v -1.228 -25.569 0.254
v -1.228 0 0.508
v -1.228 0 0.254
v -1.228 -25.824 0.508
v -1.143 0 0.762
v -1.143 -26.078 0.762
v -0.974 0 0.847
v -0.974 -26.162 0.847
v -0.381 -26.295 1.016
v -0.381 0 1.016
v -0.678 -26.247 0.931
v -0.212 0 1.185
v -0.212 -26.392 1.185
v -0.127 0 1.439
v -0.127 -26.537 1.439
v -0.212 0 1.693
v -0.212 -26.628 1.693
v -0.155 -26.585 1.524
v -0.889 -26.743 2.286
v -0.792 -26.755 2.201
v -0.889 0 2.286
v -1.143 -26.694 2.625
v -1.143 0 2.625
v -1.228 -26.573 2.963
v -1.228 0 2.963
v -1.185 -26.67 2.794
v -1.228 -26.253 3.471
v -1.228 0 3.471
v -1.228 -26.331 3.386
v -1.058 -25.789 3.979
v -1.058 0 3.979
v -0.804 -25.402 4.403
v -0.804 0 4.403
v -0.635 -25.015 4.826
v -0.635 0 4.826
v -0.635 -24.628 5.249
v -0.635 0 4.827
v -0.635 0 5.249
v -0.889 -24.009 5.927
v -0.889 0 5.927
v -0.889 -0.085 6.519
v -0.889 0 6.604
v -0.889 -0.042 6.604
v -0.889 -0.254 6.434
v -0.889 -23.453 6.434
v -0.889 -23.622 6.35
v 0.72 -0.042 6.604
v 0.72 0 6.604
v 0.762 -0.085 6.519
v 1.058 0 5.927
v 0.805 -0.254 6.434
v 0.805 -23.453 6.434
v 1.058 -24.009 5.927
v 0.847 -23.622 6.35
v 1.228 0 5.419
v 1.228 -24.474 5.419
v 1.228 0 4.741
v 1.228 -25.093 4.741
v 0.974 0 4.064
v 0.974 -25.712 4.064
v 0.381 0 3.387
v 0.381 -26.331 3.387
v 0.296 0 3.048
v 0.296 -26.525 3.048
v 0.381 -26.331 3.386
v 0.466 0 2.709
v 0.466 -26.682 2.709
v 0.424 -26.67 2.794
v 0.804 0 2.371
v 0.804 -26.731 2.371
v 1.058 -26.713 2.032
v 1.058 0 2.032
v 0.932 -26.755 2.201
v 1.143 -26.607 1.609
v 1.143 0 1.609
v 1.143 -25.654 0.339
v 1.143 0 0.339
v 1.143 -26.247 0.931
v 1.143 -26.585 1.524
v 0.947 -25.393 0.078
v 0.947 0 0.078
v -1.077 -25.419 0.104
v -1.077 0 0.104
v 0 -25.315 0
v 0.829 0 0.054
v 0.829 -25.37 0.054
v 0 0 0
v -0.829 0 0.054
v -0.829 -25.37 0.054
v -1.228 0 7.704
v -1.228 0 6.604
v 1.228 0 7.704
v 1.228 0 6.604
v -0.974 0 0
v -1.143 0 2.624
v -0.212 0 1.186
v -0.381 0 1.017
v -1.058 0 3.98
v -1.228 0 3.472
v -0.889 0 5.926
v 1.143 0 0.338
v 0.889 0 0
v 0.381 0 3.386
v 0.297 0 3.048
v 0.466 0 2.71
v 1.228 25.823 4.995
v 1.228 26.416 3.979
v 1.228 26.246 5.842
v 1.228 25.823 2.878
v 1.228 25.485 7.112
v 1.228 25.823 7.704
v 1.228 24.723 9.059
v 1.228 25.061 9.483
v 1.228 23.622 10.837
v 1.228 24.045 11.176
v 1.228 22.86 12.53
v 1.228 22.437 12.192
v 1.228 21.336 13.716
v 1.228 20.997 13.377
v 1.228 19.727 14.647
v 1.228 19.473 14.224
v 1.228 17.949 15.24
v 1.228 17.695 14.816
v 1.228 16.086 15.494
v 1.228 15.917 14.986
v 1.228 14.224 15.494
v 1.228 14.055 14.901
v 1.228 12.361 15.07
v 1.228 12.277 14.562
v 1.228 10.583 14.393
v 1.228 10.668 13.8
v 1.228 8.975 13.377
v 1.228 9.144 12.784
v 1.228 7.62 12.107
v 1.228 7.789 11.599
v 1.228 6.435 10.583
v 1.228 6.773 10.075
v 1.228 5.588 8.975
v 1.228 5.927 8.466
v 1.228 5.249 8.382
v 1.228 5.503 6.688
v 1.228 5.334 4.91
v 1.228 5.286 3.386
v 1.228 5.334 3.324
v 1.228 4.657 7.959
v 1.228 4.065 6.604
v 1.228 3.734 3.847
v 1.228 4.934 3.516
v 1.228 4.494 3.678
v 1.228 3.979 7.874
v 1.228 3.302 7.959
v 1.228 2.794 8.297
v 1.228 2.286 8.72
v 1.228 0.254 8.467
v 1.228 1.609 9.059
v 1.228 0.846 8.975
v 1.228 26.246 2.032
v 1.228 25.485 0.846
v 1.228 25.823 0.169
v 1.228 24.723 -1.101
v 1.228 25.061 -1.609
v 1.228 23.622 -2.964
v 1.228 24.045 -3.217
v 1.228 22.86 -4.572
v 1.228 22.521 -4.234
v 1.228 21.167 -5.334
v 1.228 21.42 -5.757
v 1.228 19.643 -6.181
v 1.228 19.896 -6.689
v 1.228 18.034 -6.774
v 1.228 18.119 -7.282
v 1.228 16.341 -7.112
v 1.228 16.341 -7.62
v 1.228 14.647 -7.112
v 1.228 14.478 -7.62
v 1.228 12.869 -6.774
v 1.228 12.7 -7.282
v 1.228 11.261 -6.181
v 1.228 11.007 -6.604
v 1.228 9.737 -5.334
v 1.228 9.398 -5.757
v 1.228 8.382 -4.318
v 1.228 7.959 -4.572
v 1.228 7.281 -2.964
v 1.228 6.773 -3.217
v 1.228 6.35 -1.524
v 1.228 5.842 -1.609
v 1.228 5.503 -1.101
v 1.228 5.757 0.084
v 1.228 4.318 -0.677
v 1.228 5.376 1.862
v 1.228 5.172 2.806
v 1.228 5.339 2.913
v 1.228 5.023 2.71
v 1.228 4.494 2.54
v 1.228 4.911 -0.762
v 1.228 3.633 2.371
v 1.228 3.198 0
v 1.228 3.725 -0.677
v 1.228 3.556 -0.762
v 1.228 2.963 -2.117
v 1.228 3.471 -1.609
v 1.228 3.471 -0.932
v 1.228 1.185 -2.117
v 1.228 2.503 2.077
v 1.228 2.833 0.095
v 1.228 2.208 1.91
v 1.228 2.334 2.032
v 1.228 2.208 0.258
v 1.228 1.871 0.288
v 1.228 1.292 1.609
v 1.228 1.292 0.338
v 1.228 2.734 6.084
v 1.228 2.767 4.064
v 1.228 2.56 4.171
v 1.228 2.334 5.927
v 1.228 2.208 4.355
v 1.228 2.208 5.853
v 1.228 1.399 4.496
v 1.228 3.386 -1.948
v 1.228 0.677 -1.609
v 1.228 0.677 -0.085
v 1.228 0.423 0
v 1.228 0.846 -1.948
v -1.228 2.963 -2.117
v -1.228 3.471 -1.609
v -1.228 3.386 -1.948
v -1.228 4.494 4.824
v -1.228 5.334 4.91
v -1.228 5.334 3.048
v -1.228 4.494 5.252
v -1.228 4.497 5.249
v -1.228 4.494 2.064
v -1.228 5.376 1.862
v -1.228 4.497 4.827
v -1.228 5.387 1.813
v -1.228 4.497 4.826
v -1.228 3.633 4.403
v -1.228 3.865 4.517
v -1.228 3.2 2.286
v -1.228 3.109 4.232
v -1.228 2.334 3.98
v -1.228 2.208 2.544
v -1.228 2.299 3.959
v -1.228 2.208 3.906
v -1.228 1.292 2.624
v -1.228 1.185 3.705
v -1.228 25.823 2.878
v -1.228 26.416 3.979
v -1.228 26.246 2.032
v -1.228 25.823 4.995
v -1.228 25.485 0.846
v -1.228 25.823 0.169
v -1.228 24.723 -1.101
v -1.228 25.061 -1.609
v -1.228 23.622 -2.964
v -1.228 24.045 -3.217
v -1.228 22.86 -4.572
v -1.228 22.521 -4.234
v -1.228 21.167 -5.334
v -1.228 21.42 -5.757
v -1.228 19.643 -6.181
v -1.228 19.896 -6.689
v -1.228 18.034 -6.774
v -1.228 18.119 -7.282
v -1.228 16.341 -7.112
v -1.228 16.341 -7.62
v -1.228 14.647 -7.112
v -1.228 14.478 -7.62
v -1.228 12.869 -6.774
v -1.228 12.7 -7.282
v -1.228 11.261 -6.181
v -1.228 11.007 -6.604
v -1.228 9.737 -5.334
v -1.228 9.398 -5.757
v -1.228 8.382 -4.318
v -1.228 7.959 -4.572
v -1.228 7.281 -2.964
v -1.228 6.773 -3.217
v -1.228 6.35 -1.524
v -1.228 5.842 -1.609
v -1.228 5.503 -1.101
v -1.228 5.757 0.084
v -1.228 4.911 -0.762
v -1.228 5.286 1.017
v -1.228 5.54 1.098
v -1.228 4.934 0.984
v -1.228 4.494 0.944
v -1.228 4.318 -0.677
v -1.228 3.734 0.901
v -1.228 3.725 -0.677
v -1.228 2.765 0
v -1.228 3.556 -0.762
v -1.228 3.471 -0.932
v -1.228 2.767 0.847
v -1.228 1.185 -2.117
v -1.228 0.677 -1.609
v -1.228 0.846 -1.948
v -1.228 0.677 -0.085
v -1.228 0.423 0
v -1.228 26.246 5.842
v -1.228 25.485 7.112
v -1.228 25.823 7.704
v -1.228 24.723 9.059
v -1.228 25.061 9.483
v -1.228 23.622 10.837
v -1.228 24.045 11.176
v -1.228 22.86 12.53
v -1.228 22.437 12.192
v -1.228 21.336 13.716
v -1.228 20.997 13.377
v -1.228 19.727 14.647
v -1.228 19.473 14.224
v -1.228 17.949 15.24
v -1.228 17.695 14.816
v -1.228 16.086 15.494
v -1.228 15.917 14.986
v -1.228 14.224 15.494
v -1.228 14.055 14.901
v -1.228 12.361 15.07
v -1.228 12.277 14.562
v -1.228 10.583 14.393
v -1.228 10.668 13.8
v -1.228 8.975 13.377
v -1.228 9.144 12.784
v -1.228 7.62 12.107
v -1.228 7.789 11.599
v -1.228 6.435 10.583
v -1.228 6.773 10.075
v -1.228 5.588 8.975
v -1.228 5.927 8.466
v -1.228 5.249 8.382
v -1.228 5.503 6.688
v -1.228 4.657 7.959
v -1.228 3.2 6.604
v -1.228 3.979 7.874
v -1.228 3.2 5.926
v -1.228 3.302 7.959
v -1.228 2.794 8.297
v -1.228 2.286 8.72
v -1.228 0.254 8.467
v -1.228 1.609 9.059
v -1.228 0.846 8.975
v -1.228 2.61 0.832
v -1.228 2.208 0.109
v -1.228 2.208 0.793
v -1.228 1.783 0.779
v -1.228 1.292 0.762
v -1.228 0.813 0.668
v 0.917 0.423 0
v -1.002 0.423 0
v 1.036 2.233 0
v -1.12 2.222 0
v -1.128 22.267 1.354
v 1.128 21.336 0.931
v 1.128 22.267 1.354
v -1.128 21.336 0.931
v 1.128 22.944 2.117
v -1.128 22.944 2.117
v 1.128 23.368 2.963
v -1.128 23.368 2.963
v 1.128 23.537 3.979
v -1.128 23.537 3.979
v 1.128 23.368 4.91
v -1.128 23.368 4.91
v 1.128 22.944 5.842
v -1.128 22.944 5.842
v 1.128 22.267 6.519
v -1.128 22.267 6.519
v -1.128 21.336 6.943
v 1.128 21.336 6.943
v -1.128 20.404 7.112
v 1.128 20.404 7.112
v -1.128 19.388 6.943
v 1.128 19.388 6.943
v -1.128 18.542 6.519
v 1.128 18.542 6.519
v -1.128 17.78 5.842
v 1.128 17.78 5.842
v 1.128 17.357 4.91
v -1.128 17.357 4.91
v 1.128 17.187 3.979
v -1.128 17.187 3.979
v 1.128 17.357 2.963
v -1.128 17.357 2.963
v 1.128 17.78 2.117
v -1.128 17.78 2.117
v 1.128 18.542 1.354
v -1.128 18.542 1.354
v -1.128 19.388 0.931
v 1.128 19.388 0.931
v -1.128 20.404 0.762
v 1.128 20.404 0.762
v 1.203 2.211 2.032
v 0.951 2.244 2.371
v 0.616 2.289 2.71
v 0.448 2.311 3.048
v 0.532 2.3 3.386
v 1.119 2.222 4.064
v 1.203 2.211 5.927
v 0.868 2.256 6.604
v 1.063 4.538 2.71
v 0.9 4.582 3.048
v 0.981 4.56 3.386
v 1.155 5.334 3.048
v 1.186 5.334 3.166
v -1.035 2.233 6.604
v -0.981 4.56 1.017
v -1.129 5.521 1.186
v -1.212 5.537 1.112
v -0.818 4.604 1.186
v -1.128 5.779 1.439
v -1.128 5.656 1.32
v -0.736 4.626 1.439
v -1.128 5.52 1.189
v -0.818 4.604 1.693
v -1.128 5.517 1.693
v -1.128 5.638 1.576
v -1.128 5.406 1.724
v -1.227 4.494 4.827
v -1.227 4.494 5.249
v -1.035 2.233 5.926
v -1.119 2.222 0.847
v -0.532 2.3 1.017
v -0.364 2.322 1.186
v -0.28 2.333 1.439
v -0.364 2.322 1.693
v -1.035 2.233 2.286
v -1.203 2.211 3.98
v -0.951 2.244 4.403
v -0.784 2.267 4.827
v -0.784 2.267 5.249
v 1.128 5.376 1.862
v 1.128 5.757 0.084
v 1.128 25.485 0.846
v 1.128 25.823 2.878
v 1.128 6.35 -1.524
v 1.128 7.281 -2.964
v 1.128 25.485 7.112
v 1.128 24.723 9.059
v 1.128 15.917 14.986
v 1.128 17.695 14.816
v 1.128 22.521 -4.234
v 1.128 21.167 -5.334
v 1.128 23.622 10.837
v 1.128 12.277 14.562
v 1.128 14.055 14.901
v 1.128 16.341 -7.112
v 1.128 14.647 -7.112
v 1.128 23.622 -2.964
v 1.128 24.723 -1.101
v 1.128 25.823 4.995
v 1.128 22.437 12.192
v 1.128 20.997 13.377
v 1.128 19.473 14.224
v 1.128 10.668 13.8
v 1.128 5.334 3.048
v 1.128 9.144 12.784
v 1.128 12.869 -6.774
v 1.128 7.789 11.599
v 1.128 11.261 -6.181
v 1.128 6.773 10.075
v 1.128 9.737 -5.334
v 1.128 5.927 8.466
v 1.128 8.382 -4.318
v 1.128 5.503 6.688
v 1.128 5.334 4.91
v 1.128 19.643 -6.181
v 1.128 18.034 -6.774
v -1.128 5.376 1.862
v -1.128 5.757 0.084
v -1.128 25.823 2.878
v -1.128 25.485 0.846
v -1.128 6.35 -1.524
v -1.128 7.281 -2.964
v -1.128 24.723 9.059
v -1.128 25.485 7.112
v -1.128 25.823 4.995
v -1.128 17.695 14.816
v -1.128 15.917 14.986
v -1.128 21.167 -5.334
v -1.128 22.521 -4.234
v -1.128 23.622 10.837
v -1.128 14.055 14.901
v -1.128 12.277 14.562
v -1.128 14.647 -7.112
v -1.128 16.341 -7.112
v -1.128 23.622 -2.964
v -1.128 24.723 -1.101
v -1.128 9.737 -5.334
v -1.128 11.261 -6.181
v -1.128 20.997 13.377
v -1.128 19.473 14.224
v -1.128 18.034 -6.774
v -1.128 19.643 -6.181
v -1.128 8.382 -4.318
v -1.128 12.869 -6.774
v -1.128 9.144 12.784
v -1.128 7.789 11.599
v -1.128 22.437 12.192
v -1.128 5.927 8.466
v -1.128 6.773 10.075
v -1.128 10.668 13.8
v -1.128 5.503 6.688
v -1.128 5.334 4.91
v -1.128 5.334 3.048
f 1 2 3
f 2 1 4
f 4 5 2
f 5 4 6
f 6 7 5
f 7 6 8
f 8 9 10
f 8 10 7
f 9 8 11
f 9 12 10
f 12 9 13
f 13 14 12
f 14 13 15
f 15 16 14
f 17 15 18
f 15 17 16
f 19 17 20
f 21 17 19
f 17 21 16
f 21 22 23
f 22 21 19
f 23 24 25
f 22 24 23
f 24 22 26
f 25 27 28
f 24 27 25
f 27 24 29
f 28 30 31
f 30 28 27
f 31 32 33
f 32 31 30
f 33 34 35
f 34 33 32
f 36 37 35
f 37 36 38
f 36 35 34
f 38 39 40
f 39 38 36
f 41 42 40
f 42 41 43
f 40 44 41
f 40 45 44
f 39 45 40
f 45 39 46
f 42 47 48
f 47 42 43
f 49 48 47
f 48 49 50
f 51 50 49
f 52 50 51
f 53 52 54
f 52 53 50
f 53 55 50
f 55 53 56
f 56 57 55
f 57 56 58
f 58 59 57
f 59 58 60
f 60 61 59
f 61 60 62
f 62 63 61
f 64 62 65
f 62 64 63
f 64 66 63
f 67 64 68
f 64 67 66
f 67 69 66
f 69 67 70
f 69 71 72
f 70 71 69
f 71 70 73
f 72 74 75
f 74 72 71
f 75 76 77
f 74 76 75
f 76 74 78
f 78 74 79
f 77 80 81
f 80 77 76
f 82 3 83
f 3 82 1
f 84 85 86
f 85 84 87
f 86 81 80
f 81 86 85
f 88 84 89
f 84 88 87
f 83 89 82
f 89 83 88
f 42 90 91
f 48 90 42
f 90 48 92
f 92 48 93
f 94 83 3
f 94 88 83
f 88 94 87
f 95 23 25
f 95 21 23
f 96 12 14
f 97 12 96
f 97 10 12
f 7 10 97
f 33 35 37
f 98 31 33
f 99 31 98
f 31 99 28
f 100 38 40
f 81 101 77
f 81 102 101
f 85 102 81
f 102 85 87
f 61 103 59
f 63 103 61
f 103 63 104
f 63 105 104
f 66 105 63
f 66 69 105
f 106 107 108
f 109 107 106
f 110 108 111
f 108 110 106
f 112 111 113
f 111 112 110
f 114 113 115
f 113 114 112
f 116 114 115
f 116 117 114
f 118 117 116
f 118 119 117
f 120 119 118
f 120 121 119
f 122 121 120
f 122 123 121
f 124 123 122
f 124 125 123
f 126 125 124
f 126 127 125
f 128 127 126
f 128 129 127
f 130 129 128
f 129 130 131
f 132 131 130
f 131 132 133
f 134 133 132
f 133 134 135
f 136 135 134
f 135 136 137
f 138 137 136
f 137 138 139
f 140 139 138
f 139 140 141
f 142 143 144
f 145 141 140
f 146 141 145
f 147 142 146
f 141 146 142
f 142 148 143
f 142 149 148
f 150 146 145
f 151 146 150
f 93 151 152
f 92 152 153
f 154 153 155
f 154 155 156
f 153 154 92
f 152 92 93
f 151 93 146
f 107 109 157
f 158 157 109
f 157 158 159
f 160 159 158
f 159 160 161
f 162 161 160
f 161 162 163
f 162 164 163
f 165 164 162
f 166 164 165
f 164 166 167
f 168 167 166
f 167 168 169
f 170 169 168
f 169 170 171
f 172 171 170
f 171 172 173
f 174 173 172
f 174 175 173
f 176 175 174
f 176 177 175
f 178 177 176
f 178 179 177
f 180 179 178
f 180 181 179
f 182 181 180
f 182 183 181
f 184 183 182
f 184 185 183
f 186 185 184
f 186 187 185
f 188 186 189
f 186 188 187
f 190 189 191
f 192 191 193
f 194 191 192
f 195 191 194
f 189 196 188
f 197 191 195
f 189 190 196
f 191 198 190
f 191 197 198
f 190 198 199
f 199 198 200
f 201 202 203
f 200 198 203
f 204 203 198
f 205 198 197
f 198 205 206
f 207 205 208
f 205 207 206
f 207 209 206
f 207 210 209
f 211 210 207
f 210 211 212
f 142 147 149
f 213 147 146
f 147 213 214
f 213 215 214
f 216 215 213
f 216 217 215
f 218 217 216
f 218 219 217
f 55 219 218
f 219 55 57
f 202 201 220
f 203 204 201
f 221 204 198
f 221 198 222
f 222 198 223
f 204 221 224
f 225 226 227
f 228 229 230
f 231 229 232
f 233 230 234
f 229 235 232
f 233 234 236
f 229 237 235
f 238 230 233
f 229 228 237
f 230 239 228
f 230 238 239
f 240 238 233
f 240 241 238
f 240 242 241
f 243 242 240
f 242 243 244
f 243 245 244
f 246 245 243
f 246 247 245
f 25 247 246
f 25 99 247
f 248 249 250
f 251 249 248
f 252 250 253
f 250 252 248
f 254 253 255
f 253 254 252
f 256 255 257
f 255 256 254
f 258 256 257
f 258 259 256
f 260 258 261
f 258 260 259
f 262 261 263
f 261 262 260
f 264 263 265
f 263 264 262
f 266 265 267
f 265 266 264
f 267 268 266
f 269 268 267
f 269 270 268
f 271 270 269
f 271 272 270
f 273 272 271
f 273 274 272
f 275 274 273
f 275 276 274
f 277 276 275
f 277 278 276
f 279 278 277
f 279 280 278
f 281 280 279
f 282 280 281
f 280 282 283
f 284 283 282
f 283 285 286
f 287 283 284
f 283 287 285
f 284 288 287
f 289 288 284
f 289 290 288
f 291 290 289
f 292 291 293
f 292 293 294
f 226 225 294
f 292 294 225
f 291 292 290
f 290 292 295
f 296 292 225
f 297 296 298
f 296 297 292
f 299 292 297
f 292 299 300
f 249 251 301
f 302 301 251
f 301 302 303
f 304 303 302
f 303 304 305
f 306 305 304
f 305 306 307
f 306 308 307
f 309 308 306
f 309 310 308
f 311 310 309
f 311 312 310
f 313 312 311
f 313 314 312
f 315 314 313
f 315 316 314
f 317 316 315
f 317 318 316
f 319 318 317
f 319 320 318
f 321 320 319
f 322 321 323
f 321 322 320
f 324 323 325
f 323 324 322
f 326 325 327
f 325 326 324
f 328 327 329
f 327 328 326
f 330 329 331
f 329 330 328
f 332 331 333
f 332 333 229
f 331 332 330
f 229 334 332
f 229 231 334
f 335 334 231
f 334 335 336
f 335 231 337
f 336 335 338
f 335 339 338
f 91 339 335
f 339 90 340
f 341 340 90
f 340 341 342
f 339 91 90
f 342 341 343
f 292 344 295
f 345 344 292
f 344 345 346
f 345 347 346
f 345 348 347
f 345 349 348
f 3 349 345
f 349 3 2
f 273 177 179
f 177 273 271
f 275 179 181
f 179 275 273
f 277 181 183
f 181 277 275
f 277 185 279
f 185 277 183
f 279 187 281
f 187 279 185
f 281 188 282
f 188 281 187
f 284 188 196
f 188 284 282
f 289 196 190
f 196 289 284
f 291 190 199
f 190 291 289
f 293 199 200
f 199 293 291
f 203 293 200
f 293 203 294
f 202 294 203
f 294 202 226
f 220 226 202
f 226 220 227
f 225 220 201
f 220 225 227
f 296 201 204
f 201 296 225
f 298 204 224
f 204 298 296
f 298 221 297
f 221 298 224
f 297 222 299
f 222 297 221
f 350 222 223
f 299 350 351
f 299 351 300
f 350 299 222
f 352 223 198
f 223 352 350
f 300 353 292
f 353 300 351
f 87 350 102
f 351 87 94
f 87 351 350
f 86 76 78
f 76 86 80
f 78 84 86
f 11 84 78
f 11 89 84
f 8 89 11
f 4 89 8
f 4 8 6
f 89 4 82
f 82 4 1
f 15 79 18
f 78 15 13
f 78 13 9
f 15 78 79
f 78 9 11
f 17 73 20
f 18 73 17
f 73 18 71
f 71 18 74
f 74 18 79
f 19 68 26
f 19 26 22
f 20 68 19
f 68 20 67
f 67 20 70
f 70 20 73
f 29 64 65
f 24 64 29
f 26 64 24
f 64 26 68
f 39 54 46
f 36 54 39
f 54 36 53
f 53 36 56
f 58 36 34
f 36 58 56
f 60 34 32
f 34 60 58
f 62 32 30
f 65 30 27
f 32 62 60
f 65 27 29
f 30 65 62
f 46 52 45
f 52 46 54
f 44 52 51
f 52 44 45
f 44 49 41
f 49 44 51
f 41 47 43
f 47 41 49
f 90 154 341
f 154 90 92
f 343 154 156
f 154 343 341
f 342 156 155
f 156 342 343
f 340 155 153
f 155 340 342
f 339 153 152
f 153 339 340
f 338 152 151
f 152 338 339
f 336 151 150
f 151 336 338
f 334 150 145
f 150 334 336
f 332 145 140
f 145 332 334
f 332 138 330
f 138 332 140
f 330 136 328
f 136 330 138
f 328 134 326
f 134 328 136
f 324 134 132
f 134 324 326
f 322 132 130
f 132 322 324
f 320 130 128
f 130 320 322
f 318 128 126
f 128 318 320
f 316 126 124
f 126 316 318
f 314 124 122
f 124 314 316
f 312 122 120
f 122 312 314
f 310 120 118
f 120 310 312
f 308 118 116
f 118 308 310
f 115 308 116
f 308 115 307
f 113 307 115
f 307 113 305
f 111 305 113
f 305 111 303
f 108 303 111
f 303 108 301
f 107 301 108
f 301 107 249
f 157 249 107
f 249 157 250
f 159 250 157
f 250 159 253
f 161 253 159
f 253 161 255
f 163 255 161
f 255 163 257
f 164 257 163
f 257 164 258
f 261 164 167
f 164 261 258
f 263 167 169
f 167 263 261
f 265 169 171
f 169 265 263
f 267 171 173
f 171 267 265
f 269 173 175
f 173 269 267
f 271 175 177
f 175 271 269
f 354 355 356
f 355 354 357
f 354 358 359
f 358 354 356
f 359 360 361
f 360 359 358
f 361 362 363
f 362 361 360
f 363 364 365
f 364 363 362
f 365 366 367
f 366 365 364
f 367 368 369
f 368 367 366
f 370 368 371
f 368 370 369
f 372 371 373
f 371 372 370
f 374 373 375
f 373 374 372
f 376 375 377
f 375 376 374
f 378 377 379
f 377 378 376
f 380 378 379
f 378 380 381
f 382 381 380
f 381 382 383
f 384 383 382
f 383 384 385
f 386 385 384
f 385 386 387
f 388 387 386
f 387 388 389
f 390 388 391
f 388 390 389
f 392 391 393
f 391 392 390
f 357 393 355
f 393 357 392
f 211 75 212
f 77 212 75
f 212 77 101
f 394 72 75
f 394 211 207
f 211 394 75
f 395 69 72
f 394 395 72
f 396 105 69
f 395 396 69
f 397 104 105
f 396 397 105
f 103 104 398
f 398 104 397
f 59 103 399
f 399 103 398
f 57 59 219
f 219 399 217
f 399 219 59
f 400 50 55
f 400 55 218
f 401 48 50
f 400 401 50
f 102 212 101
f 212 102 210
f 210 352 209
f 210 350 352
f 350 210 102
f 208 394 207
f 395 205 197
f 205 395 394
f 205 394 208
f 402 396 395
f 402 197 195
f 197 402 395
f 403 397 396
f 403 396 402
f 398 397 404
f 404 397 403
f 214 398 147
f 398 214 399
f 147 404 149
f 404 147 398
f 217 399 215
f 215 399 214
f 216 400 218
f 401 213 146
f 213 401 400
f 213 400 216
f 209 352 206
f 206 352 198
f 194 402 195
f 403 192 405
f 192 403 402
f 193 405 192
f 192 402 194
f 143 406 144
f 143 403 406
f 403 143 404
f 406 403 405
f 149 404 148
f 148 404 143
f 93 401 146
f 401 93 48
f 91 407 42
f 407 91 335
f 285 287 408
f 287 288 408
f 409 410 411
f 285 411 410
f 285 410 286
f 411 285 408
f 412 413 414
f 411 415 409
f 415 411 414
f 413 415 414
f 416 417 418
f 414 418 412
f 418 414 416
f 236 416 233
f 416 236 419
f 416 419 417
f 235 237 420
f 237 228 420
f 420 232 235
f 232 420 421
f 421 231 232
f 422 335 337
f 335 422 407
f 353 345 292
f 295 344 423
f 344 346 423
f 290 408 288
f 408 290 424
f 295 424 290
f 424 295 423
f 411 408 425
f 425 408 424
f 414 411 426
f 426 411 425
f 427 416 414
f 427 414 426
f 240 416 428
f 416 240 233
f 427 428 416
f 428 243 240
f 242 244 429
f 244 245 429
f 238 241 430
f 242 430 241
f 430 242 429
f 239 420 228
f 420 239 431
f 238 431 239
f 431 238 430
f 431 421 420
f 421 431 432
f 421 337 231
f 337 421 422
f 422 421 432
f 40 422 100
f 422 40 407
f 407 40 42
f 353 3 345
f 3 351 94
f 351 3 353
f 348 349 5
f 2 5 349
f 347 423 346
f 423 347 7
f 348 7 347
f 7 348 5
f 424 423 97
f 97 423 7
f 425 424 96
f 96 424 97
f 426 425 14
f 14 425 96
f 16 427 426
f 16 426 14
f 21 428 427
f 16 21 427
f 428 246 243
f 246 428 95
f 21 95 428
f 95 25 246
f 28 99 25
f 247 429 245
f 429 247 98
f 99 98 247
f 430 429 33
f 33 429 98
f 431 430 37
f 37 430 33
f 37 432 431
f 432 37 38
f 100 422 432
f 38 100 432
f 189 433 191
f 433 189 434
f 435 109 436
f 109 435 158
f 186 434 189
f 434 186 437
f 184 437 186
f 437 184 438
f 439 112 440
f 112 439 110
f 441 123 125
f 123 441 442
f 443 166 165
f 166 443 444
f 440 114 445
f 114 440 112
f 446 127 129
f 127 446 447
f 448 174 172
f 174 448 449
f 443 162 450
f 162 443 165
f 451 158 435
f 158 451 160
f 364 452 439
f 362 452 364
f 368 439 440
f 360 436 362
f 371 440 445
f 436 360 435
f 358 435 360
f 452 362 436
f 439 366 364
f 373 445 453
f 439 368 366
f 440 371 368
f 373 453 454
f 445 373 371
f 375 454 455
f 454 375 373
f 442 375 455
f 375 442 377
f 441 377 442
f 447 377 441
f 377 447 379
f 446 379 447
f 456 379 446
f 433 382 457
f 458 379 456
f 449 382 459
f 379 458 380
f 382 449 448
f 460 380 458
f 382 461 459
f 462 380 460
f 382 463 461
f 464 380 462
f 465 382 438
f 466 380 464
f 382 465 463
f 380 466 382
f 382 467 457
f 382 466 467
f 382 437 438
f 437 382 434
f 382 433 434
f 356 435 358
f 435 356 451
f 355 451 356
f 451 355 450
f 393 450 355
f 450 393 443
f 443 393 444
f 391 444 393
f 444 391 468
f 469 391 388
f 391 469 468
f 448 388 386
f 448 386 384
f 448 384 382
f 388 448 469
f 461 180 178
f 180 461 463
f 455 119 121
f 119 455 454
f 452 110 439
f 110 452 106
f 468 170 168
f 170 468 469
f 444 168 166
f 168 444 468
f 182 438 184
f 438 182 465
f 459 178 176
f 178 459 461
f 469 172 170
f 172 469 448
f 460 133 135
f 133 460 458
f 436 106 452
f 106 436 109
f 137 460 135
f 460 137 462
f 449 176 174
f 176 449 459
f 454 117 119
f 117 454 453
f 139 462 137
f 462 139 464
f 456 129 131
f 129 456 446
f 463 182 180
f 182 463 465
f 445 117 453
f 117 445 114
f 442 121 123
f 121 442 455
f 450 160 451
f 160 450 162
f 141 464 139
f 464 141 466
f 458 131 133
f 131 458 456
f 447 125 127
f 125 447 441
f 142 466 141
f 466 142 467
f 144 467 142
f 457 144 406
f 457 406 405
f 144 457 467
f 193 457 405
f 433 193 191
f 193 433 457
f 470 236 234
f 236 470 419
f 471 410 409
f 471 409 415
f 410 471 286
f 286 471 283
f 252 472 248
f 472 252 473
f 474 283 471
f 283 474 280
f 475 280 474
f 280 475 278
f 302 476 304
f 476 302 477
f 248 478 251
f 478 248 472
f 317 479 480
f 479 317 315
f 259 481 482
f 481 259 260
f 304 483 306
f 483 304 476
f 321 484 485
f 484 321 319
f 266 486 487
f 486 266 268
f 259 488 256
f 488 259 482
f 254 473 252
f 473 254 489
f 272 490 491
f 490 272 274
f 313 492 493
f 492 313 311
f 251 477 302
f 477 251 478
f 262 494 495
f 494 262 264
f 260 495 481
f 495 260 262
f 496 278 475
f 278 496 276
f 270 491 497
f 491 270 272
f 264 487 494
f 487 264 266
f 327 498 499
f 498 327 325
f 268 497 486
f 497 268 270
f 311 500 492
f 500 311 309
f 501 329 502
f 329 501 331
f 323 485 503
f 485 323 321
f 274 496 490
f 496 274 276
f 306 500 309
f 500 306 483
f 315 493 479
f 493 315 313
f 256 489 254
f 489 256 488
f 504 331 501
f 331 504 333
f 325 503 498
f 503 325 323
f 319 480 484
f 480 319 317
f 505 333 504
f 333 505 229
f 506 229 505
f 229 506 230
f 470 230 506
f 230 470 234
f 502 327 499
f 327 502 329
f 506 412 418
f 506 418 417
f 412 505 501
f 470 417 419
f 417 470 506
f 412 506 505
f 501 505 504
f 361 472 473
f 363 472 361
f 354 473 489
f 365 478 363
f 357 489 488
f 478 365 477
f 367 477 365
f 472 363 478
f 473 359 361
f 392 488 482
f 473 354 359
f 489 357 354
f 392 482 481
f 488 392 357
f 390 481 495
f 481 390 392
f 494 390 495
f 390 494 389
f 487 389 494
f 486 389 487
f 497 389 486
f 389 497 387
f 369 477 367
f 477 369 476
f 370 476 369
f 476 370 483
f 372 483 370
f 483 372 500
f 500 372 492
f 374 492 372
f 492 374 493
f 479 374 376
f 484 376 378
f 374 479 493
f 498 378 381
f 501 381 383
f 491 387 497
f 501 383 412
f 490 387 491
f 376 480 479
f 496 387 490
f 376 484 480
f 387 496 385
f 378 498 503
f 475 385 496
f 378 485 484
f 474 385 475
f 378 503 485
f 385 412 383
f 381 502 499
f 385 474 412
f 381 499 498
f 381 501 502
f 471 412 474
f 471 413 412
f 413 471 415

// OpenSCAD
use <keygen.scad>
include <medeco.scad>

module medeco_classic(bitting="",
                      outline_name="1515",
                      warding_name="1515") {

    name = "Medeco Classic";

    /*
        "A" variants of key outlines indicates 6-pin version.

        Bitting is specified from bow to tip, 1-6, with 1 being the shallowest cut and 6 being the deepest.

        After each number, a letter L, C, or R is specified for the cut angle: left, center or right.

        Example: 2L5C3C6R3R
    */

    outlines_k = ["A1515",
                  "1515",
                  "A1517",
                  "1517",
                  "1518",
                  "1542",
                  "1543",
                  "A1638",
                  "1638",
                  "1644",
                  "1655"];

    wardings_k = ["1515",
                  "1517",
                  "1518",
                  "1542",
                  "1543",
                  "1638",
                  "1644",
                  "1655"];

    outline_param = key_lkup(outlines_k, outlines_v, outline_name);
    outline_points = outline_param[0];
    outline_paths = outline_param[1];
    offset = outline_param[2];
    engrave_points = outline_param[3];
    engrave_paths = outline_param[4];

    warding_points = key_lkup(wardings_k, wardings_v, warding_name);
    
    cut_locations = [for(i=[0.244, 0.414, 0.584, 0.754, 0.924, 1.094]) i*25.4];
    depth_table = [for(i=[0.266+0.030:-0.030:0.115]) i*25.4];
    angles_k = ["L", "C", "R"];
    angles_v = [20, 0, -20];

    bitting_depth = [for(i=[0:2:len(bitting)-1]) bitting[i]];
    bitting_angle = [for(i=[1:2:len(bitting)-1]) bitting[i]];
    heights = key_code_to_heights(bitting_depth, depth_table);
    angles = [for(c=bitting_angle) key_lkup(angles_k, angles_v, c)];

    difference() {
        if($children == 0) {
            key_blank(outline_points,
                      warding_points,
                      outline_paths=outline_paths,
                      engrave_right_points=engrave_points,
                      engrave_right_paths=engrave_paths,
                      engrave_left_points=engrave_points,
                      engrave_left_paths=engrave_paths,
                      offset=offset,
                      plug_diameter=12.7);
        } else {
            children(0);
        }
        key_bitting(heights, cut_locations,
                    flat=.381, angle=86, // from CW-1012 cutter specs
                    angles=angles);
    }
}

// Defaults
bitting="";
outline="1542";
warding="1542";
medeco_classic(bitting, outline, warding);
